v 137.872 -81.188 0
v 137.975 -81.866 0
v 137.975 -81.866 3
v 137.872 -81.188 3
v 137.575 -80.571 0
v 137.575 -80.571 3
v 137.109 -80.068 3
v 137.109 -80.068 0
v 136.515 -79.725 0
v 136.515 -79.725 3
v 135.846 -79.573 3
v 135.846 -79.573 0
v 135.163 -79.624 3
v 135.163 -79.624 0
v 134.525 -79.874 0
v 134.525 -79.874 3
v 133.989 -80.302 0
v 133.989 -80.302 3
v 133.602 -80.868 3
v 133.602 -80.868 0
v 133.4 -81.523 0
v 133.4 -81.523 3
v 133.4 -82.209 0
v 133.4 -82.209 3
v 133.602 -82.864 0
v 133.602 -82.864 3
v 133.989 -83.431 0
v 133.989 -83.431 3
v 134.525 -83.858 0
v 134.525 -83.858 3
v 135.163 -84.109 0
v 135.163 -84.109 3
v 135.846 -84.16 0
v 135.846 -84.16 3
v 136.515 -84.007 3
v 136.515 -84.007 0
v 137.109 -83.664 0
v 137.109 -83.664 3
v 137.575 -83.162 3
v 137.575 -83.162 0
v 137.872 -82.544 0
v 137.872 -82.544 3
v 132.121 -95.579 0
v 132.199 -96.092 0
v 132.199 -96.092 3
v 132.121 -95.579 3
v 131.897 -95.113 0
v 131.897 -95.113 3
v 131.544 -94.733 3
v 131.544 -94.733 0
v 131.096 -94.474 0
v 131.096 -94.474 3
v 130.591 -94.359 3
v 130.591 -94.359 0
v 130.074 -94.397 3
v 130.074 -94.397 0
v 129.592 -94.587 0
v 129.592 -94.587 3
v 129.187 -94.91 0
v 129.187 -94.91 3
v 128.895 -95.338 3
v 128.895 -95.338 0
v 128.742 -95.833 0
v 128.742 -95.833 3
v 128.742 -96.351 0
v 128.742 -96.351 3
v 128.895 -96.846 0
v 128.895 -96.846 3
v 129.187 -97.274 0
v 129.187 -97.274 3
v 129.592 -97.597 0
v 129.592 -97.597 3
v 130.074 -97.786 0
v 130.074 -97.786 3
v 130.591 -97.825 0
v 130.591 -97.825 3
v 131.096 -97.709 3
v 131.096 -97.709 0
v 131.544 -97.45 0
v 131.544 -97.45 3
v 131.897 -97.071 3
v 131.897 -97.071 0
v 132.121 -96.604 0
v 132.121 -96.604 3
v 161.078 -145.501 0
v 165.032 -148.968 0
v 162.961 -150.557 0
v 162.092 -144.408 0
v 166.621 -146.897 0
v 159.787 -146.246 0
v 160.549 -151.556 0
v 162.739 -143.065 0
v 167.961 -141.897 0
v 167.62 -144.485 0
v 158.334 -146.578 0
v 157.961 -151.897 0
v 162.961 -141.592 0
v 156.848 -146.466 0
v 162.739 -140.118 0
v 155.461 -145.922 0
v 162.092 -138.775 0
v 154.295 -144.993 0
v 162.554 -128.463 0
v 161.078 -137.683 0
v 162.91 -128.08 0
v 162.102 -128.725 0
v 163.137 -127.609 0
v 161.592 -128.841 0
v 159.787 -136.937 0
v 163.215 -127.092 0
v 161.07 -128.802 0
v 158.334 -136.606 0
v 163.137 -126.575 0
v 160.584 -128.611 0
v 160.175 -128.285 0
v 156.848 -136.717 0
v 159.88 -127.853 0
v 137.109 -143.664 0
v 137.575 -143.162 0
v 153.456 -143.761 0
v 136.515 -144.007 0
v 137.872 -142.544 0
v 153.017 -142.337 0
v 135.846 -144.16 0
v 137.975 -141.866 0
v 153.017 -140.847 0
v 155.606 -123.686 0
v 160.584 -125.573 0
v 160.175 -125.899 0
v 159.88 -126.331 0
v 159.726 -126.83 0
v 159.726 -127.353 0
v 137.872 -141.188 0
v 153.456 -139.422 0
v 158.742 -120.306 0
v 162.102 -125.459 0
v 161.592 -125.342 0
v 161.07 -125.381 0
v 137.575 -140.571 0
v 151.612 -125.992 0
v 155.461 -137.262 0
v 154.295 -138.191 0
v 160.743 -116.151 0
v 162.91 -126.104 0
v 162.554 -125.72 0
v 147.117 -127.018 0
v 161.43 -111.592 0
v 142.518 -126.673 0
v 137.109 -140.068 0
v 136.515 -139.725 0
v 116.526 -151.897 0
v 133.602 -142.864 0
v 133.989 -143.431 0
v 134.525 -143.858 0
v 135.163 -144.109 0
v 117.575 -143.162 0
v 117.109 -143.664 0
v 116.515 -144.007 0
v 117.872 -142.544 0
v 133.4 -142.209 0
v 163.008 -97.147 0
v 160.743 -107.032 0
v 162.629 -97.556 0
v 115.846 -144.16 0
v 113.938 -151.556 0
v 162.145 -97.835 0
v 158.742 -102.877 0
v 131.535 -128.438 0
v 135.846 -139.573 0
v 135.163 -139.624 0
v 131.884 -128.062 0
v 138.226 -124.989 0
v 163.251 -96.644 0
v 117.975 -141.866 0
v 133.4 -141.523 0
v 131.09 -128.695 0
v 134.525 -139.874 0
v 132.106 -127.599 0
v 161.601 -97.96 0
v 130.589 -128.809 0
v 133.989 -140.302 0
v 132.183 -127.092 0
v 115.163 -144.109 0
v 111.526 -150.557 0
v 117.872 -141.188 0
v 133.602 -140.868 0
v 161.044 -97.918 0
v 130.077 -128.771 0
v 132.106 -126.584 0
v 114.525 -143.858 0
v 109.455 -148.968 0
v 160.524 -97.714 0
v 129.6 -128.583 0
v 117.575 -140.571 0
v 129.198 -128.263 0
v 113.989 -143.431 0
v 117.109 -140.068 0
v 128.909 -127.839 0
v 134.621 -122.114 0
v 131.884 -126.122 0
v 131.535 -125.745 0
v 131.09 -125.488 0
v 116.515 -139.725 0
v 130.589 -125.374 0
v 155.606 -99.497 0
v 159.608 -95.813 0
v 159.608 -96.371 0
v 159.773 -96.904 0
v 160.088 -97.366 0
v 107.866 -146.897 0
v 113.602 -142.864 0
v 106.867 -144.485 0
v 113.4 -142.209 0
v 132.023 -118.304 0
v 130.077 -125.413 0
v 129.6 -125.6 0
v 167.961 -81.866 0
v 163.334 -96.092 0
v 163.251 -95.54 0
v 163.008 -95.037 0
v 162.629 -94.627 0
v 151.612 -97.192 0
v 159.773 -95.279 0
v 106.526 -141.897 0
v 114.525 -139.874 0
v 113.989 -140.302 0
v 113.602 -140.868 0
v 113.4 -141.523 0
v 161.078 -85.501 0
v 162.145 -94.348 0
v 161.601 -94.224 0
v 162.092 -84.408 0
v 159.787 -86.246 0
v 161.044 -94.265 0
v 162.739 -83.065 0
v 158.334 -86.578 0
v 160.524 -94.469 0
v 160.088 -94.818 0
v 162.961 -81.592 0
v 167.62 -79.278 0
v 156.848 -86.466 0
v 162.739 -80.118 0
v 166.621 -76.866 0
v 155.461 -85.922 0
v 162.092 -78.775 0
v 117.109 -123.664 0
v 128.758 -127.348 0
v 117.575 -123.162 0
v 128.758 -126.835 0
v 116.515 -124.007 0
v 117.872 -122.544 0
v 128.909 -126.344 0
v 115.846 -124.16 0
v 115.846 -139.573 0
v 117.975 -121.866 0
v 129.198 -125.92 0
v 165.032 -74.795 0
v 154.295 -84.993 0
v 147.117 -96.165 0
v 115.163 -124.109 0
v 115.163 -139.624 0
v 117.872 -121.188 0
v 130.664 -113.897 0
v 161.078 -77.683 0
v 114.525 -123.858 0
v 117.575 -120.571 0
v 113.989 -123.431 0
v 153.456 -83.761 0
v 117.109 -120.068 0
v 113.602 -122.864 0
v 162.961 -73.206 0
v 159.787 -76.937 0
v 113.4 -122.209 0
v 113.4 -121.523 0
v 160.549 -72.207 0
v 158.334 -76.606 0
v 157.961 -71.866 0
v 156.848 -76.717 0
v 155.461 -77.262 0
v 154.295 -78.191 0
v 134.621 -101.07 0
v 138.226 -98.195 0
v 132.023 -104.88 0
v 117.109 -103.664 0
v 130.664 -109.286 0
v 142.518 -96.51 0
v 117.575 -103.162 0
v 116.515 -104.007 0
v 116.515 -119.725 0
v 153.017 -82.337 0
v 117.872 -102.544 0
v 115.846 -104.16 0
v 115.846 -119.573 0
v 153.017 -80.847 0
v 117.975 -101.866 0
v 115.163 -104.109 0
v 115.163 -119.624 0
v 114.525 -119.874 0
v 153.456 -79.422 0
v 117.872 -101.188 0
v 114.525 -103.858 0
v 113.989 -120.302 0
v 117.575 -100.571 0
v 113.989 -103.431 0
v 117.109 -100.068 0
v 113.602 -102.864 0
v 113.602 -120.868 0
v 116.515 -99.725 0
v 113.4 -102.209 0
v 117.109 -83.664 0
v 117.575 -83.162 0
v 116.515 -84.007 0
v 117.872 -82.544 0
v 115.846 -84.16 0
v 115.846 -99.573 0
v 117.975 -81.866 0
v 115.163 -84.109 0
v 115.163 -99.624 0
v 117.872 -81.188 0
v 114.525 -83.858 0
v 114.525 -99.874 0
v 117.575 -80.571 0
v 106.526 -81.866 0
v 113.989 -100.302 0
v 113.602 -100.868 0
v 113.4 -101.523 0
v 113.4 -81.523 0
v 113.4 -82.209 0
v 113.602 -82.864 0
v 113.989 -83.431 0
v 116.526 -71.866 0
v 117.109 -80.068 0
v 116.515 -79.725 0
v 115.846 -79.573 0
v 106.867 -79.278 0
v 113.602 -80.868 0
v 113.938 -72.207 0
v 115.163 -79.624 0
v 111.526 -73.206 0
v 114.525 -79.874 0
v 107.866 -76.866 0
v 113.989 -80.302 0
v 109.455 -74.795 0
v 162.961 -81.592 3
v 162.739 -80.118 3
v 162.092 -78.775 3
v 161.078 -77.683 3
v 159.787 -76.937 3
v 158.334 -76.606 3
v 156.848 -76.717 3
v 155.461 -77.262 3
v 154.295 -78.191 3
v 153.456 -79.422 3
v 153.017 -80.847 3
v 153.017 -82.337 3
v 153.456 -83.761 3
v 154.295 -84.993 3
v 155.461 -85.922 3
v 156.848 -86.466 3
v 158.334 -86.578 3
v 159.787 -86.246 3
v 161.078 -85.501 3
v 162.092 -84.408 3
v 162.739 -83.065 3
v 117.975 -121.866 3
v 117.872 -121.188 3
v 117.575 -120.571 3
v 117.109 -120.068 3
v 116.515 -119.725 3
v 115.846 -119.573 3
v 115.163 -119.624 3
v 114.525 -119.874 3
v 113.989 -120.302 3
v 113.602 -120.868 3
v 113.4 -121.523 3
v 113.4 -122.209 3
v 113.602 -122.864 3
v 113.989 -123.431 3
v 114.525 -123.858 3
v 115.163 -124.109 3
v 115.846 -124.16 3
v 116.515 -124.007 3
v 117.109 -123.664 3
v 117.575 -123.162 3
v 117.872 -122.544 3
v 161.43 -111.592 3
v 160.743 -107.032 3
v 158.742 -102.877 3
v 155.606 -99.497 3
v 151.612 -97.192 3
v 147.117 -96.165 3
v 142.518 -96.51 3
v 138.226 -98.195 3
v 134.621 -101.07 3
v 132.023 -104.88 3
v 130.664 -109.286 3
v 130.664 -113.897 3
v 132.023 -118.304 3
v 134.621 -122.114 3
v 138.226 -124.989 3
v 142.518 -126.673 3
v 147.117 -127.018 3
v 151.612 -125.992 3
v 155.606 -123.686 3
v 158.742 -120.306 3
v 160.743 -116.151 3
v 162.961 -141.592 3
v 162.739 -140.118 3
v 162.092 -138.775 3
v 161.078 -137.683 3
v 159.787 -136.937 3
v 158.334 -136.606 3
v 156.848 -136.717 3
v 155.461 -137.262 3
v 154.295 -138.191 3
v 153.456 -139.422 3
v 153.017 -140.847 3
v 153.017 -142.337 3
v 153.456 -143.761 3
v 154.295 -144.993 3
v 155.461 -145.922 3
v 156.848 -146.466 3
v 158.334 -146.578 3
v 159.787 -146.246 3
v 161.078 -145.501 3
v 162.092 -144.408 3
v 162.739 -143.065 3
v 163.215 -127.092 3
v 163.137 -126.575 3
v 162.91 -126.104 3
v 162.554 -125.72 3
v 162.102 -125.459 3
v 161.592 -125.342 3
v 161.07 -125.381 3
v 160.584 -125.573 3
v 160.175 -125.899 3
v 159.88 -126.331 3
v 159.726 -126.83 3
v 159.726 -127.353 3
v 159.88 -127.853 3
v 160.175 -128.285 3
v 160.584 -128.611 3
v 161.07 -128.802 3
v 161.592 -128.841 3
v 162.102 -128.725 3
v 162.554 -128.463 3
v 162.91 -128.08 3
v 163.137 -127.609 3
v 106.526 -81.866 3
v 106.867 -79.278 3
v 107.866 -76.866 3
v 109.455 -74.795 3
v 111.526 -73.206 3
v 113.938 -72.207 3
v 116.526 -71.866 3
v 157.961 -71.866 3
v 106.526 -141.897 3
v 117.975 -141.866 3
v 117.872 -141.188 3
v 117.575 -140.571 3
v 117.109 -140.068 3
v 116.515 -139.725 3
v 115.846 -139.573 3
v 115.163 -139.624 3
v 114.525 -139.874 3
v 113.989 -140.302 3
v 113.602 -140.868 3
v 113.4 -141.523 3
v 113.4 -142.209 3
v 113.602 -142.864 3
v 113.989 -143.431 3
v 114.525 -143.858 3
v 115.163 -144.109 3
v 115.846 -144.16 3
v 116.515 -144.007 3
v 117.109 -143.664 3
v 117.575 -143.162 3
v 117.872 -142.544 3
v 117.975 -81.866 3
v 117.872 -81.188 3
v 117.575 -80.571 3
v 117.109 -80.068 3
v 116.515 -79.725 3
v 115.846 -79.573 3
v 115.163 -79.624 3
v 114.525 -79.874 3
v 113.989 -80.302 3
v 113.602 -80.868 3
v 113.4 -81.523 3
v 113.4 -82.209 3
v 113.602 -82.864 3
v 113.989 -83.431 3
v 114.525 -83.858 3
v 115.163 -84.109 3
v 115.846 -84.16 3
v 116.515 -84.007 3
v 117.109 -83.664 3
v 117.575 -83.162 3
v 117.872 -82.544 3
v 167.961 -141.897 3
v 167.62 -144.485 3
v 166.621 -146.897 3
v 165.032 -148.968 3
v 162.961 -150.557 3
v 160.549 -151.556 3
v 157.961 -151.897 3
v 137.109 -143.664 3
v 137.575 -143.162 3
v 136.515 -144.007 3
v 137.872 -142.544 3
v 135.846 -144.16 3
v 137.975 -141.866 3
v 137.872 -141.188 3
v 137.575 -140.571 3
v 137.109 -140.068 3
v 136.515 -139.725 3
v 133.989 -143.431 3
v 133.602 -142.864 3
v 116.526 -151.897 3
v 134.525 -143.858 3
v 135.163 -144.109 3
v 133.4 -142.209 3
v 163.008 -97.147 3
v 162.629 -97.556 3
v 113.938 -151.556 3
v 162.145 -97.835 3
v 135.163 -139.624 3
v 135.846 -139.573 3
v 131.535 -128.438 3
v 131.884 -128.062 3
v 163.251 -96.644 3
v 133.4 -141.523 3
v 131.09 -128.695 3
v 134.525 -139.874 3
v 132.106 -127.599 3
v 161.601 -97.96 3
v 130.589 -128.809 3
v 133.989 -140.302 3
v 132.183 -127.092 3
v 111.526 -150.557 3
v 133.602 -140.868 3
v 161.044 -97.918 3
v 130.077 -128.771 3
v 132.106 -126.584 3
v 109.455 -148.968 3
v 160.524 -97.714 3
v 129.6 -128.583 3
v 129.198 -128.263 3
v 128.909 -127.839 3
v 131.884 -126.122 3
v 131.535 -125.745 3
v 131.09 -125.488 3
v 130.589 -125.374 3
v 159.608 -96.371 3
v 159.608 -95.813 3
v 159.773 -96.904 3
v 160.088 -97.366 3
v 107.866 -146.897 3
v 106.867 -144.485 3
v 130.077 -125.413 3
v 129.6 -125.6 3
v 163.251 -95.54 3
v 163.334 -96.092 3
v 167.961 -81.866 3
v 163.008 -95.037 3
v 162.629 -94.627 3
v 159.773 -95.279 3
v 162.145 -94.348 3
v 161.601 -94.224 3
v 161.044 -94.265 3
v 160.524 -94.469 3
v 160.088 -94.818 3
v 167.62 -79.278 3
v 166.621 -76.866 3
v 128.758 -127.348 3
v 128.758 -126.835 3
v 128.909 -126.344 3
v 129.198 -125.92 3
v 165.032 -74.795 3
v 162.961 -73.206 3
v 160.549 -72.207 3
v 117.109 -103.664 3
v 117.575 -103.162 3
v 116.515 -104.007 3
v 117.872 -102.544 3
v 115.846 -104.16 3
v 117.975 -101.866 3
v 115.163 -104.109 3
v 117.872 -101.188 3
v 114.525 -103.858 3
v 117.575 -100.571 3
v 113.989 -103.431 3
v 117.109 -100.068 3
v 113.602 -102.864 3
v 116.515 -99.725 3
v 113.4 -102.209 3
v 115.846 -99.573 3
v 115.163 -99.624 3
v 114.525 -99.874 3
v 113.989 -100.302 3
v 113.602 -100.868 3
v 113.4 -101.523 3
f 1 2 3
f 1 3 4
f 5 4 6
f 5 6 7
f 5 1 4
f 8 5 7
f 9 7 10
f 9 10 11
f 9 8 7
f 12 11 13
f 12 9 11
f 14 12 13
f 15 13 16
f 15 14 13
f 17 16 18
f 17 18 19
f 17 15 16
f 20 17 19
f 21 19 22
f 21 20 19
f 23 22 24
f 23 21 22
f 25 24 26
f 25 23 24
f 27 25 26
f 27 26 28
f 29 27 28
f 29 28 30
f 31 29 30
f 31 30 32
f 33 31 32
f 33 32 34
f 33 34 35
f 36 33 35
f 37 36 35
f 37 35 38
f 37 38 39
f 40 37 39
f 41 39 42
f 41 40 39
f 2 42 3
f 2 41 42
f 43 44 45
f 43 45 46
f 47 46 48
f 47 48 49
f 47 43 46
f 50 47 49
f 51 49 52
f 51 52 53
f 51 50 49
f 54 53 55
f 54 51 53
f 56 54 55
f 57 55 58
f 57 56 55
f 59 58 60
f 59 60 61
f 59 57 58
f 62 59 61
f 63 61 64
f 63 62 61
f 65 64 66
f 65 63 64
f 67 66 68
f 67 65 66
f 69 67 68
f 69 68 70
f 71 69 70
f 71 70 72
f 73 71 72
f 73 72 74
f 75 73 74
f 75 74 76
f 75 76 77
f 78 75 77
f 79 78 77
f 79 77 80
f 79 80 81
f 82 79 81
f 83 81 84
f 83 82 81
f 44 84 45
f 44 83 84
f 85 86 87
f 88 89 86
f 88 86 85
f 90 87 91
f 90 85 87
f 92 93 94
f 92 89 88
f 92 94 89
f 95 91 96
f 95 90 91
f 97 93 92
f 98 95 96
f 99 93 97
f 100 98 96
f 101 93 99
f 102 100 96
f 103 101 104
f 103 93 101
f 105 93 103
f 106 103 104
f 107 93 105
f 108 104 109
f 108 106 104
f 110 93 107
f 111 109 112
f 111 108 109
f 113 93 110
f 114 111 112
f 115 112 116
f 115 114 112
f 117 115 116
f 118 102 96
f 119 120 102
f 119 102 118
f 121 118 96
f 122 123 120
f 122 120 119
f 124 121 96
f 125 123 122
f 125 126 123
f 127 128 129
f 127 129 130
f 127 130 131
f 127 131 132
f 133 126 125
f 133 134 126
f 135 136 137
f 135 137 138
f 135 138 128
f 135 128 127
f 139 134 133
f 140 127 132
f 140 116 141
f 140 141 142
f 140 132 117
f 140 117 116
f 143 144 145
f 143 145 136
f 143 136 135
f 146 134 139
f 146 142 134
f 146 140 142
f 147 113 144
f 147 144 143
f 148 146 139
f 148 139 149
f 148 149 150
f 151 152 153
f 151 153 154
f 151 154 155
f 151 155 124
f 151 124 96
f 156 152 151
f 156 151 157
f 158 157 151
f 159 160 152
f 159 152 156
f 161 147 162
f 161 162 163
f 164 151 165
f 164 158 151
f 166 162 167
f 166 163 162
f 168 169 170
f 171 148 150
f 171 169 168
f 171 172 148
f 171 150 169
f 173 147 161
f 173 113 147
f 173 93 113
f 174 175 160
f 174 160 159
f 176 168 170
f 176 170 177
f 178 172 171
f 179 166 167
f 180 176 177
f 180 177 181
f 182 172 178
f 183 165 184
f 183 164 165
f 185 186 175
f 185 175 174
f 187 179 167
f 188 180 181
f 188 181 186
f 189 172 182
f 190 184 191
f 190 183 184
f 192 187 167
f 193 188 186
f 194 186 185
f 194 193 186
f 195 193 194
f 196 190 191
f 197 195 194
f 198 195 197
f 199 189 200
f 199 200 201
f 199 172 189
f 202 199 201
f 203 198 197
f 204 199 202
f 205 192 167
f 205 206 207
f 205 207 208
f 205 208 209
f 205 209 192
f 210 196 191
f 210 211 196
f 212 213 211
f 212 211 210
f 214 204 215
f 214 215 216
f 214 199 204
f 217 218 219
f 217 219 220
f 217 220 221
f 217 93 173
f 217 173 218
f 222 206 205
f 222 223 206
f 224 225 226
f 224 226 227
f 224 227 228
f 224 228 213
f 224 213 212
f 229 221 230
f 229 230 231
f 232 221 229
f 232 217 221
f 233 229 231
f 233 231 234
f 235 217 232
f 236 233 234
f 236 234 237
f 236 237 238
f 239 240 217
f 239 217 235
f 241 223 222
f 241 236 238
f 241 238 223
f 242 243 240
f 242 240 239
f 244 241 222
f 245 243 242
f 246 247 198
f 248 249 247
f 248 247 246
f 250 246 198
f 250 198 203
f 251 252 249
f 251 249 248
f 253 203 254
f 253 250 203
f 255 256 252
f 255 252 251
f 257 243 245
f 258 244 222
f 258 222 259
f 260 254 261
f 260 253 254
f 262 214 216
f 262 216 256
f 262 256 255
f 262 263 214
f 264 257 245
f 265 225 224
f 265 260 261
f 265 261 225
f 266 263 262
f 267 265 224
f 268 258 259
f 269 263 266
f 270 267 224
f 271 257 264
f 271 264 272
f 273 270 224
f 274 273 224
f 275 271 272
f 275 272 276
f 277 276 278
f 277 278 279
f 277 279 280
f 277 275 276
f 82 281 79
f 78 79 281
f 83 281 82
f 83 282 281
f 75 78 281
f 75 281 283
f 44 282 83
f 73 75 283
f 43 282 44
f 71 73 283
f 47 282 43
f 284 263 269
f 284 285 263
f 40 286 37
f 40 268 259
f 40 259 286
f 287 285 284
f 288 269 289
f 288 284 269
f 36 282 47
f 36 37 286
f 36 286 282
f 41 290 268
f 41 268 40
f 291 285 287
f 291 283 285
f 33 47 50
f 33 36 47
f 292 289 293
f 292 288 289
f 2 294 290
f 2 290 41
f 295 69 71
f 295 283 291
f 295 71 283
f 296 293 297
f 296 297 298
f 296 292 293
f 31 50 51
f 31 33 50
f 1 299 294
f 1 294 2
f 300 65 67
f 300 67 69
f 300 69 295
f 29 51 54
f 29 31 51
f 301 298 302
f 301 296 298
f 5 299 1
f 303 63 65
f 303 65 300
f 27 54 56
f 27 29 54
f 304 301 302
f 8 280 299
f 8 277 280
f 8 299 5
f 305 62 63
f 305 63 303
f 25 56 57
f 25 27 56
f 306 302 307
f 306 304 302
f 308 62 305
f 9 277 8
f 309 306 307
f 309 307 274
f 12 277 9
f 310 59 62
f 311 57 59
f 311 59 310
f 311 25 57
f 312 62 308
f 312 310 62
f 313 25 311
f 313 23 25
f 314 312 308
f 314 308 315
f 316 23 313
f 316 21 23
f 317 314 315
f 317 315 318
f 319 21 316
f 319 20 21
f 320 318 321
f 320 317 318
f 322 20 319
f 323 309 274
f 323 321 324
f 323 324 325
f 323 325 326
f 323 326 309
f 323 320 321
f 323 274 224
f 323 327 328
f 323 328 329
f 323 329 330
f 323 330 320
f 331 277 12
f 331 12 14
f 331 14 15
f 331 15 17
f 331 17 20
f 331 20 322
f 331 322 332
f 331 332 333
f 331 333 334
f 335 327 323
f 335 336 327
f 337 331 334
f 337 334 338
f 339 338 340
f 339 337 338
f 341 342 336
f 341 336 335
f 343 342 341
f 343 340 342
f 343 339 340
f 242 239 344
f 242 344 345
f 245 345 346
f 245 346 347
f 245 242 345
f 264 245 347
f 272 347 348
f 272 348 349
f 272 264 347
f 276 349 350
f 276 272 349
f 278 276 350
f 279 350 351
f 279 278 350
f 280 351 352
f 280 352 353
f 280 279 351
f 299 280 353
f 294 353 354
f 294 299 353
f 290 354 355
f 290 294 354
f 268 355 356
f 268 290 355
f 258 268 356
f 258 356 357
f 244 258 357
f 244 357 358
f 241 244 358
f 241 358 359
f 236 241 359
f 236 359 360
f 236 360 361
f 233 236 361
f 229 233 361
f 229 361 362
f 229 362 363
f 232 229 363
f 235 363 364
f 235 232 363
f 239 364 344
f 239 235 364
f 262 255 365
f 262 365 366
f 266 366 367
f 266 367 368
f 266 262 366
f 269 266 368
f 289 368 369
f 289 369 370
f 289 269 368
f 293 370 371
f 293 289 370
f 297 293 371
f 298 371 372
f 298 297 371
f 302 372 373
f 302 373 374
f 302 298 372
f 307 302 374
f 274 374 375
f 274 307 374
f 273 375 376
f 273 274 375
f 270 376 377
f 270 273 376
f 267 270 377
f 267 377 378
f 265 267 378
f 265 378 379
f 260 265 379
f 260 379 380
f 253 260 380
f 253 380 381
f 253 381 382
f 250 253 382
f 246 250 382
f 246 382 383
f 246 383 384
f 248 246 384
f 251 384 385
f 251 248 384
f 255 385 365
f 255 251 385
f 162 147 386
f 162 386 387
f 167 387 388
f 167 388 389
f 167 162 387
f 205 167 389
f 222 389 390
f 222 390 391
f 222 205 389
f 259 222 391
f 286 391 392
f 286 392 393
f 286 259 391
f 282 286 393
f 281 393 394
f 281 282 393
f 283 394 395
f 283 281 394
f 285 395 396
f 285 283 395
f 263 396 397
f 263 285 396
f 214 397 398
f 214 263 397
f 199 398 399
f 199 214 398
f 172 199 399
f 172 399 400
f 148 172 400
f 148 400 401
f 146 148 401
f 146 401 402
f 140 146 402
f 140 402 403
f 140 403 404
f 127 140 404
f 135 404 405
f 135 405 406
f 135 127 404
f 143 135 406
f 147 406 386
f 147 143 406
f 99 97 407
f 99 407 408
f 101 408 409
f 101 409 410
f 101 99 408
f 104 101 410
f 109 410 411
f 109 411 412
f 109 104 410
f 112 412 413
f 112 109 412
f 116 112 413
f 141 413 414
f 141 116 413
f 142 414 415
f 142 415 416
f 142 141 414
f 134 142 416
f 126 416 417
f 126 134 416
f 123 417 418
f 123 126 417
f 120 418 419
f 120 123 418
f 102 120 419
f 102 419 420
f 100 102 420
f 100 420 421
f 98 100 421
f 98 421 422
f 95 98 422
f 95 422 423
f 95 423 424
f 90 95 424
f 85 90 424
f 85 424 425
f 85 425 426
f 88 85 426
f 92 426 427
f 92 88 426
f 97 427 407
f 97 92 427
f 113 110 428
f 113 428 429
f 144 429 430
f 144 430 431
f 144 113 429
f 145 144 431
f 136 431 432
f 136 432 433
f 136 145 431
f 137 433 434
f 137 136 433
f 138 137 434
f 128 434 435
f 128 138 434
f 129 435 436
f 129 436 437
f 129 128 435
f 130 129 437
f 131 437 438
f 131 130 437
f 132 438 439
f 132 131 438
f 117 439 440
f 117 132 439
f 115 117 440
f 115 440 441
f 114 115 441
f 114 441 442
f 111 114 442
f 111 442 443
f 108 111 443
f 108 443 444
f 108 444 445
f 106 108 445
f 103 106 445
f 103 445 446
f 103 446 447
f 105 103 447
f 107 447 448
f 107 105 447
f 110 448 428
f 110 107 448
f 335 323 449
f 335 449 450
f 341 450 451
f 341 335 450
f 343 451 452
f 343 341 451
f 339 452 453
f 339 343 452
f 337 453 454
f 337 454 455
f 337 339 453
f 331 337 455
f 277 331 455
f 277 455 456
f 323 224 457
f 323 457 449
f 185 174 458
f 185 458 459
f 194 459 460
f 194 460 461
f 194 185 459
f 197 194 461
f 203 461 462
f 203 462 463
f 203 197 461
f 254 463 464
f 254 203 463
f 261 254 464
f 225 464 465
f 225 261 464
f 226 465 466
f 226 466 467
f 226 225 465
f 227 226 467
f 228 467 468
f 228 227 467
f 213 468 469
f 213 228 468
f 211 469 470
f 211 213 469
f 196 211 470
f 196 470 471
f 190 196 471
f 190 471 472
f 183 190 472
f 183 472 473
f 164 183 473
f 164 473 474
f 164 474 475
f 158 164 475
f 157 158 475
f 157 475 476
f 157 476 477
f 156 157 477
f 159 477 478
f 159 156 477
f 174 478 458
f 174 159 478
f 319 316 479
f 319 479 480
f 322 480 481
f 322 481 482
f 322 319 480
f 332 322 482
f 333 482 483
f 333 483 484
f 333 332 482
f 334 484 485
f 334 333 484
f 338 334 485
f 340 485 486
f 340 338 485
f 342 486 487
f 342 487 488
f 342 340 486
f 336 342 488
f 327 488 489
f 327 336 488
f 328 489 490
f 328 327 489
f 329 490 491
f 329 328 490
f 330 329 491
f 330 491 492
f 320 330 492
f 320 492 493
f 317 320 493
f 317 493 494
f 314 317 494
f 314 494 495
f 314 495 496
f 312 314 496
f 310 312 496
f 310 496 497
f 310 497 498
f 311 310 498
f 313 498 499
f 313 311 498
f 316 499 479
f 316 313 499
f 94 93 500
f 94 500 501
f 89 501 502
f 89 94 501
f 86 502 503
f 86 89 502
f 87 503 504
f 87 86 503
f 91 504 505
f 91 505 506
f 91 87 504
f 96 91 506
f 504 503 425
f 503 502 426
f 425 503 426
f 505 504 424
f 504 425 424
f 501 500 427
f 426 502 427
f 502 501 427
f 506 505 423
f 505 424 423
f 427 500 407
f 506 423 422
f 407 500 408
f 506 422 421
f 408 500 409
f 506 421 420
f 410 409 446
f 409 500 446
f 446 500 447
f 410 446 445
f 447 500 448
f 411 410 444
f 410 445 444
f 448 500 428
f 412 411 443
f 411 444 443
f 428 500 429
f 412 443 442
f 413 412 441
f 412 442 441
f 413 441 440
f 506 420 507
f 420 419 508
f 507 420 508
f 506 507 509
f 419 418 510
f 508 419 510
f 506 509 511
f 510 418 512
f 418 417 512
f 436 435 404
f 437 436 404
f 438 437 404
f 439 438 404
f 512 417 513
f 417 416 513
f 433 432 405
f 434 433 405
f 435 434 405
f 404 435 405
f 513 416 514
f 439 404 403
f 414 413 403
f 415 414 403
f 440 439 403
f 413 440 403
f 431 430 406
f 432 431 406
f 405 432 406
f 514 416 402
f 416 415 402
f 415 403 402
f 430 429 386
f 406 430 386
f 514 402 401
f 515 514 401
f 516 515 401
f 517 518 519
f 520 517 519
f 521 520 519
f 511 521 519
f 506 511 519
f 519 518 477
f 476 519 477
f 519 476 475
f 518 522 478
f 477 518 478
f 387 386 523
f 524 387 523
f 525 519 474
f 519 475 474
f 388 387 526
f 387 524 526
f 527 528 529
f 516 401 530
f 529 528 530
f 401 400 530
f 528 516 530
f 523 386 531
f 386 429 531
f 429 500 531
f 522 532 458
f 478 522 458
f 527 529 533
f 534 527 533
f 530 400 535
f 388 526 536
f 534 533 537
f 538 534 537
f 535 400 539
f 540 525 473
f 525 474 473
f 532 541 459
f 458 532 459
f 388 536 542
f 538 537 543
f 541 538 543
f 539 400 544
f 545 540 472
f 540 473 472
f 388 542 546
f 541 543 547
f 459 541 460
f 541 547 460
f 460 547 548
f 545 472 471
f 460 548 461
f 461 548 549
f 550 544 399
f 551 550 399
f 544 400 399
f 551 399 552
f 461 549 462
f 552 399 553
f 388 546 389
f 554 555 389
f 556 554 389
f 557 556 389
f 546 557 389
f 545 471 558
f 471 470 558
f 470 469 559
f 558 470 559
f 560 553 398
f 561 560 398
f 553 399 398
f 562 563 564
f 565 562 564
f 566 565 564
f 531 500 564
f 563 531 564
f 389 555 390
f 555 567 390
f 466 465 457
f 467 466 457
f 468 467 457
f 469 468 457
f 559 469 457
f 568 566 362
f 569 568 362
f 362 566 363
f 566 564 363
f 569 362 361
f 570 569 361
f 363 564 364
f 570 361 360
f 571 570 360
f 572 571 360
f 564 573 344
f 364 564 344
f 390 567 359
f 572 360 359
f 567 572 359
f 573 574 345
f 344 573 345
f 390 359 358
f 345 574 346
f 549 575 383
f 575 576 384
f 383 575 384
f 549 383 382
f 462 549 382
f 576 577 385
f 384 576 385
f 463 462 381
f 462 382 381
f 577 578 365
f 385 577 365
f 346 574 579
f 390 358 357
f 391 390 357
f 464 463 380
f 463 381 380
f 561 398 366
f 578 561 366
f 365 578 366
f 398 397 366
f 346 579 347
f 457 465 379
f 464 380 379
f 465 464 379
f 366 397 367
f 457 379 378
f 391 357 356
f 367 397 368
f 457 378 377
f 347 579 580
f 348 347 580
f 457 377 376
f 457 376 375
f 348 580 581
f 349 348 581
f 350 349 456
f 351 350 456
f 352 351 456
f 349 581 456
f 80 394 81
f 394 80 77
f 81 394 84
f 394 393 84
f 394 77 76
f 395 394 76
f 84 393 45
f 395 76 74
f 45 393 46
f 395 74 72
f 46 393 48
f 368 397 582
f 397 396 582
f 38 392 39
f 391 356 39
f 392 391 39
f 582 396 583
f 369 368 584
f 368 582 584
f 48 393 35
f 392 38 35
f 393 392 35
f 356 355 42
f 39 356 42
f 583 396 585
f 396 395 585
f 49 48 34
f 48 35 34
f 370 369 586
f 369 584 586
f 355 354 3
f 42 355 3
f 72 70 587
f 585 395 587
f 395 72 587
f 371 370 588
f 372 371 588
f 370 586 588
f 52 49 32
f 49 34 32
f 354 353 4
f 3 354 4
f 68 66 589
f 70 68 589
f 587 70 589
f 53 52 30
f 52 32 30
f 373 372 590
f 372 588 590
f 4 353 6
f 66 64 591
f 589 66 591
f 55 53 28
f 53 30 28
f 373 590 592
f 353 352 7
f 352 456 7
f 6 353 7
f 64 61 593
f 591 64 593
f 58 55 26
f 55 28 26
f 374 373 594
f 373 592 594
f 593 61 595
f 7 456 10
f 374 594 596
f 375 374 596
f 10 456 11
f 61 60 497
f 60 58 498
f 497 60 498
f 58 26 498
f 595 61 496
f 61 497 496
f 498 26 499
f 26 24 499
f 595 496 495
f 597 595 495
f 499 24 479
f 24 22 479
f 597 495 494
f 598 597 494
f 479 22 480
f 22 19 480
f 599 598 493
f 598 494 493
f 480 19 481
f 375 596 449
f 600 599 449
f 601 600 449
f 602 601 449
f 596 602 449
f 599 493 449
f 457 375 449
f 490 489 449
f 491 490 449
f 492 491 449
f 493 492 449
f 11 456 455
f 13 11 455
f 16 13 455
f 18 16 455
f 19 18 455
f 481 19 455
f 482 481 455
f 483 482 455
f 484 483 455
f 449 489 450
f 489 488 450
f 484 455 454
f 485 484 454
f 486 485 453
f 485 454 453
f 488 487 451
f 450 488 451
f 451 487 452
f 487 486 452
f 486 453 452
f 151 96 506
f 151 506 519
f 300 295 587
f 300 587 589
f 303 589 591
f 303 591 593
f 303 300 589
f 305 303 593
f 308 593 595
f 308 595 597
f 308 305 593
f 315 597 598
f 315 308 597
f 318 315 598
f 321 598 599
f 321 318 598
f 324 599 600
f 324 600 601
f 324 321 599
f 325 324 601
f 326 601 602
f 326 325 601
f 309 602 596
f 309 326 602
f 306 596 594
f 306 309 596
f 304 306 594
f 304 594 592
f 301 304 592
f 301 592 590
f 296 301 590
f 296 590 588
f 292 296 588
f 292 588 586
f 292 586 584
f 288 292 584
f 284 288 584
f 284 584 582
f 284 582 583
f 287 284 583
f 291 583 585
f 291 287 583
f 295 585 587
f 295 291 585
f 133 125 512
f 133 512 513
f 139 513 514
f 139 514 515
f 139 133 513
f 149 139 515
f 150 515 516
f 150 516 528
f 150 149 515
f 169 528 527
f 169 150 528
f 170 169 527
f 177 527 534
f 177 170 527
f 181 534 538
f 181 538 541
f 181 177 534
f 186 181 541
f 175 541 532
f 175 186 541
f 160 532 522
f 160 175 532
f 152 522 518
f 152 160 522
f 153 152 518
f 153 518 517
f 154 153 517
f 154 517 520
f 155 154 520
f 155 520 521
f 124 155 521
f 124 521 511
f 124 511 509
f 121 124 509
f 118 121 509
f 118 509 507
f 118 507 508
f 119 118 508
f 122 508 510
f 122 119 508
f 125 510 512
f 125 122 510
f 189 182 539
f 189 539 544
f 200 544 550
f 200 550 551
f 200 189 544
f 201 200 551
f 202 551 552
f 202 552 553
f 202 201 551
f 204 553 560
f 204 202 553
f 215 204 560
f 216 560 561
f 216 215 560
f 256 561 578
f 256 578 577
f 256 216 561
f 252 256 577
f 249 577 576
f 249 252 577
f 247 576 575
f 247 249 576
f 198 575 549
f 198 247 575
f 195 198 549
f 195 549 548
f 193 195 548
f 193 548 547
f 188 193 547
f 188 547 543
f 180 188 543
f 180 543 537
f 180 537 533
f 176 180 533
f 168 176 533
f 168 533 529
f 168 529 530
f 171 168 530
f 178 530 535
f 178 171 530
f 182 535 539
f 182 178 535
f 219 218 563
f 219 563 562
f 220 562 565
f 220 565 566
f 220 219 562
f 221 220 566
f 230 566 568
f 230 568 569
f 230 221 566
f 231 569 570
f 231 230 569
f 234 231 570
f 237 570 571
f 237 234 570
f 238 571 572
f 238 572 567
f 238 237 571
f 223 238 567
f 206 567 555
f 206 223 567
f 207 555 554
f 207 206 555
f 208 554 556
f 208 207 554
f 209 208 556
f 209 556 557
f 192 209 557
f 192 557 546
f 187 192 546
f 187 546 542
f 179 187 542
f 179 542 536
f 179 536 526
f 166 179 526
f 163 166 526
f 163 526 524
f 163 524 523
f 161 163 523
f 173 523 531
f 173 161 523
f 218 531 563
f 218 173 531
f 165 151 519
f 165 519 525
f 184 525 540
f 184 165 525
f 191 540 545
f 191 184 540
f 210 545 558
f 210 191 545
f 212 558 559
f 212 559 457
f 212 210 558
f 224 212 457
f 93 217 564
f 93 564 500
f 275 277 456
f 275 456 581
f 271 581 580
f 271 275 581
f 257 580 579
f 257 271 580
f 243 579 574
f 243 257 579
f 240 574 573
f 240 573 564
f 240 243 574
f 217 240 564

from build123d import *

# Parameters (mm, degrees)
SKETCH1_R           = 2.3
SKETCH1_R_2         = 1.737885662
SKETCH1_R_3         = 1.873200063
SKETCH1_R_4         = 1.722278718
SKETCH1_R_5         = 1.754205974
SKETCH1_R_6         = 15.469551166
SKETCH1_R_7         = 5
BOSS_EXTRUDE1_DEPTH = 3


with BuildPart() as part:
    # Sketch1 → Boss-Extrude1 (new body)
    with BuildSketch(Plane.XY):
        with BuildLine():
            Line((116.525823666, -71.866196008), (157.960700719, -71.866196008))
            ThreePointArc((157.960700719, -71.866196008), (165.031768531, -74.795128196), (167.960700719, -81.866196008))
            Line((167.960700719, -81.866196008), (167.960700719, -141.896756479))
            ThreePointArc((167.960700719, -141.896756479), (165.031768531, -148.967824291), (157.960700719, -151.896756479))
            Line((157.960700719, -151.896756479), (116.525823666, -151.896756479))
            ThreePointArc((116.525823666, -151.896756479), (109.454755854, -148.967824291), (106.525823666, -141.896756479))
            Line((106.525823666, -141.896756479), (106.525823666, -81.866196008))
            ThreePointArc((106.525823666, -81.866196008), (109.454755854, -74.795128196), (116.525823666, -71.866196008))
        make_face()
        with Locations((115.674612816, -101.866196008)):
            Circle(SKETCH1_R, mode=Mode.SUBTRACT)
        with Locations((115.674612816, -121.866196008)):
            Circle(SKETCH1_R, mode=Mode.SUBTRACT)
        with Locations((135.674612816, -141.866196008)):
            Circle(SKETCH1_R, mode=Mode.SUBTRACT)
        with Locations((135.674612816, -81.866196008)):
            Circle(SKETCH1_R, mode=Mode.SUBTRACT)
        with Locations((115.674612816, -81.866196008)):
            Circle(SKETCH1_R, mode=Mode.SUBTRACT)
        with Locations((115.674612816, -141.866196008)):
            Circle(SKETCH1_R, mode=Mode.SUBTRACT)
        with Locations((130.460700719, -96.091712302)):
            Circle(SKETCH1_R_2, mode=Mode.SUBTRACT)
        with Locations((161.460700719, -96.091712302)):
            Circle(SKETCH1_R_3, mode=Mode.SUBTRACT)
        with Locations((130.460700719, -127.091712302)):
            Circle(SKETCH1_R_4, mode=Mode.SUBTRACT)
        with Locations((161.460700719, -127.091712302)):
            Circle(SKETCH1_R_5, mode=Mode.SUBTRACT)
        with Locations((145.960700719, -111.591712302)):
            Circle(SKETCH1_R_6, mode=Mode.SUBTRACT)
        with Locations((157.960700719, -81.591712302)):
            Circle(SKETCH1_R_7, mode=Mode.SUBTRACT)
        with Locations((157.960700719, -141.591712302)):
            Circle(SKETCH1_R_7, mode=Mode.SUBTRACT)
    extrude(amount=BOSS_EXTRUDE1_DEPTH)


solid = part.part
